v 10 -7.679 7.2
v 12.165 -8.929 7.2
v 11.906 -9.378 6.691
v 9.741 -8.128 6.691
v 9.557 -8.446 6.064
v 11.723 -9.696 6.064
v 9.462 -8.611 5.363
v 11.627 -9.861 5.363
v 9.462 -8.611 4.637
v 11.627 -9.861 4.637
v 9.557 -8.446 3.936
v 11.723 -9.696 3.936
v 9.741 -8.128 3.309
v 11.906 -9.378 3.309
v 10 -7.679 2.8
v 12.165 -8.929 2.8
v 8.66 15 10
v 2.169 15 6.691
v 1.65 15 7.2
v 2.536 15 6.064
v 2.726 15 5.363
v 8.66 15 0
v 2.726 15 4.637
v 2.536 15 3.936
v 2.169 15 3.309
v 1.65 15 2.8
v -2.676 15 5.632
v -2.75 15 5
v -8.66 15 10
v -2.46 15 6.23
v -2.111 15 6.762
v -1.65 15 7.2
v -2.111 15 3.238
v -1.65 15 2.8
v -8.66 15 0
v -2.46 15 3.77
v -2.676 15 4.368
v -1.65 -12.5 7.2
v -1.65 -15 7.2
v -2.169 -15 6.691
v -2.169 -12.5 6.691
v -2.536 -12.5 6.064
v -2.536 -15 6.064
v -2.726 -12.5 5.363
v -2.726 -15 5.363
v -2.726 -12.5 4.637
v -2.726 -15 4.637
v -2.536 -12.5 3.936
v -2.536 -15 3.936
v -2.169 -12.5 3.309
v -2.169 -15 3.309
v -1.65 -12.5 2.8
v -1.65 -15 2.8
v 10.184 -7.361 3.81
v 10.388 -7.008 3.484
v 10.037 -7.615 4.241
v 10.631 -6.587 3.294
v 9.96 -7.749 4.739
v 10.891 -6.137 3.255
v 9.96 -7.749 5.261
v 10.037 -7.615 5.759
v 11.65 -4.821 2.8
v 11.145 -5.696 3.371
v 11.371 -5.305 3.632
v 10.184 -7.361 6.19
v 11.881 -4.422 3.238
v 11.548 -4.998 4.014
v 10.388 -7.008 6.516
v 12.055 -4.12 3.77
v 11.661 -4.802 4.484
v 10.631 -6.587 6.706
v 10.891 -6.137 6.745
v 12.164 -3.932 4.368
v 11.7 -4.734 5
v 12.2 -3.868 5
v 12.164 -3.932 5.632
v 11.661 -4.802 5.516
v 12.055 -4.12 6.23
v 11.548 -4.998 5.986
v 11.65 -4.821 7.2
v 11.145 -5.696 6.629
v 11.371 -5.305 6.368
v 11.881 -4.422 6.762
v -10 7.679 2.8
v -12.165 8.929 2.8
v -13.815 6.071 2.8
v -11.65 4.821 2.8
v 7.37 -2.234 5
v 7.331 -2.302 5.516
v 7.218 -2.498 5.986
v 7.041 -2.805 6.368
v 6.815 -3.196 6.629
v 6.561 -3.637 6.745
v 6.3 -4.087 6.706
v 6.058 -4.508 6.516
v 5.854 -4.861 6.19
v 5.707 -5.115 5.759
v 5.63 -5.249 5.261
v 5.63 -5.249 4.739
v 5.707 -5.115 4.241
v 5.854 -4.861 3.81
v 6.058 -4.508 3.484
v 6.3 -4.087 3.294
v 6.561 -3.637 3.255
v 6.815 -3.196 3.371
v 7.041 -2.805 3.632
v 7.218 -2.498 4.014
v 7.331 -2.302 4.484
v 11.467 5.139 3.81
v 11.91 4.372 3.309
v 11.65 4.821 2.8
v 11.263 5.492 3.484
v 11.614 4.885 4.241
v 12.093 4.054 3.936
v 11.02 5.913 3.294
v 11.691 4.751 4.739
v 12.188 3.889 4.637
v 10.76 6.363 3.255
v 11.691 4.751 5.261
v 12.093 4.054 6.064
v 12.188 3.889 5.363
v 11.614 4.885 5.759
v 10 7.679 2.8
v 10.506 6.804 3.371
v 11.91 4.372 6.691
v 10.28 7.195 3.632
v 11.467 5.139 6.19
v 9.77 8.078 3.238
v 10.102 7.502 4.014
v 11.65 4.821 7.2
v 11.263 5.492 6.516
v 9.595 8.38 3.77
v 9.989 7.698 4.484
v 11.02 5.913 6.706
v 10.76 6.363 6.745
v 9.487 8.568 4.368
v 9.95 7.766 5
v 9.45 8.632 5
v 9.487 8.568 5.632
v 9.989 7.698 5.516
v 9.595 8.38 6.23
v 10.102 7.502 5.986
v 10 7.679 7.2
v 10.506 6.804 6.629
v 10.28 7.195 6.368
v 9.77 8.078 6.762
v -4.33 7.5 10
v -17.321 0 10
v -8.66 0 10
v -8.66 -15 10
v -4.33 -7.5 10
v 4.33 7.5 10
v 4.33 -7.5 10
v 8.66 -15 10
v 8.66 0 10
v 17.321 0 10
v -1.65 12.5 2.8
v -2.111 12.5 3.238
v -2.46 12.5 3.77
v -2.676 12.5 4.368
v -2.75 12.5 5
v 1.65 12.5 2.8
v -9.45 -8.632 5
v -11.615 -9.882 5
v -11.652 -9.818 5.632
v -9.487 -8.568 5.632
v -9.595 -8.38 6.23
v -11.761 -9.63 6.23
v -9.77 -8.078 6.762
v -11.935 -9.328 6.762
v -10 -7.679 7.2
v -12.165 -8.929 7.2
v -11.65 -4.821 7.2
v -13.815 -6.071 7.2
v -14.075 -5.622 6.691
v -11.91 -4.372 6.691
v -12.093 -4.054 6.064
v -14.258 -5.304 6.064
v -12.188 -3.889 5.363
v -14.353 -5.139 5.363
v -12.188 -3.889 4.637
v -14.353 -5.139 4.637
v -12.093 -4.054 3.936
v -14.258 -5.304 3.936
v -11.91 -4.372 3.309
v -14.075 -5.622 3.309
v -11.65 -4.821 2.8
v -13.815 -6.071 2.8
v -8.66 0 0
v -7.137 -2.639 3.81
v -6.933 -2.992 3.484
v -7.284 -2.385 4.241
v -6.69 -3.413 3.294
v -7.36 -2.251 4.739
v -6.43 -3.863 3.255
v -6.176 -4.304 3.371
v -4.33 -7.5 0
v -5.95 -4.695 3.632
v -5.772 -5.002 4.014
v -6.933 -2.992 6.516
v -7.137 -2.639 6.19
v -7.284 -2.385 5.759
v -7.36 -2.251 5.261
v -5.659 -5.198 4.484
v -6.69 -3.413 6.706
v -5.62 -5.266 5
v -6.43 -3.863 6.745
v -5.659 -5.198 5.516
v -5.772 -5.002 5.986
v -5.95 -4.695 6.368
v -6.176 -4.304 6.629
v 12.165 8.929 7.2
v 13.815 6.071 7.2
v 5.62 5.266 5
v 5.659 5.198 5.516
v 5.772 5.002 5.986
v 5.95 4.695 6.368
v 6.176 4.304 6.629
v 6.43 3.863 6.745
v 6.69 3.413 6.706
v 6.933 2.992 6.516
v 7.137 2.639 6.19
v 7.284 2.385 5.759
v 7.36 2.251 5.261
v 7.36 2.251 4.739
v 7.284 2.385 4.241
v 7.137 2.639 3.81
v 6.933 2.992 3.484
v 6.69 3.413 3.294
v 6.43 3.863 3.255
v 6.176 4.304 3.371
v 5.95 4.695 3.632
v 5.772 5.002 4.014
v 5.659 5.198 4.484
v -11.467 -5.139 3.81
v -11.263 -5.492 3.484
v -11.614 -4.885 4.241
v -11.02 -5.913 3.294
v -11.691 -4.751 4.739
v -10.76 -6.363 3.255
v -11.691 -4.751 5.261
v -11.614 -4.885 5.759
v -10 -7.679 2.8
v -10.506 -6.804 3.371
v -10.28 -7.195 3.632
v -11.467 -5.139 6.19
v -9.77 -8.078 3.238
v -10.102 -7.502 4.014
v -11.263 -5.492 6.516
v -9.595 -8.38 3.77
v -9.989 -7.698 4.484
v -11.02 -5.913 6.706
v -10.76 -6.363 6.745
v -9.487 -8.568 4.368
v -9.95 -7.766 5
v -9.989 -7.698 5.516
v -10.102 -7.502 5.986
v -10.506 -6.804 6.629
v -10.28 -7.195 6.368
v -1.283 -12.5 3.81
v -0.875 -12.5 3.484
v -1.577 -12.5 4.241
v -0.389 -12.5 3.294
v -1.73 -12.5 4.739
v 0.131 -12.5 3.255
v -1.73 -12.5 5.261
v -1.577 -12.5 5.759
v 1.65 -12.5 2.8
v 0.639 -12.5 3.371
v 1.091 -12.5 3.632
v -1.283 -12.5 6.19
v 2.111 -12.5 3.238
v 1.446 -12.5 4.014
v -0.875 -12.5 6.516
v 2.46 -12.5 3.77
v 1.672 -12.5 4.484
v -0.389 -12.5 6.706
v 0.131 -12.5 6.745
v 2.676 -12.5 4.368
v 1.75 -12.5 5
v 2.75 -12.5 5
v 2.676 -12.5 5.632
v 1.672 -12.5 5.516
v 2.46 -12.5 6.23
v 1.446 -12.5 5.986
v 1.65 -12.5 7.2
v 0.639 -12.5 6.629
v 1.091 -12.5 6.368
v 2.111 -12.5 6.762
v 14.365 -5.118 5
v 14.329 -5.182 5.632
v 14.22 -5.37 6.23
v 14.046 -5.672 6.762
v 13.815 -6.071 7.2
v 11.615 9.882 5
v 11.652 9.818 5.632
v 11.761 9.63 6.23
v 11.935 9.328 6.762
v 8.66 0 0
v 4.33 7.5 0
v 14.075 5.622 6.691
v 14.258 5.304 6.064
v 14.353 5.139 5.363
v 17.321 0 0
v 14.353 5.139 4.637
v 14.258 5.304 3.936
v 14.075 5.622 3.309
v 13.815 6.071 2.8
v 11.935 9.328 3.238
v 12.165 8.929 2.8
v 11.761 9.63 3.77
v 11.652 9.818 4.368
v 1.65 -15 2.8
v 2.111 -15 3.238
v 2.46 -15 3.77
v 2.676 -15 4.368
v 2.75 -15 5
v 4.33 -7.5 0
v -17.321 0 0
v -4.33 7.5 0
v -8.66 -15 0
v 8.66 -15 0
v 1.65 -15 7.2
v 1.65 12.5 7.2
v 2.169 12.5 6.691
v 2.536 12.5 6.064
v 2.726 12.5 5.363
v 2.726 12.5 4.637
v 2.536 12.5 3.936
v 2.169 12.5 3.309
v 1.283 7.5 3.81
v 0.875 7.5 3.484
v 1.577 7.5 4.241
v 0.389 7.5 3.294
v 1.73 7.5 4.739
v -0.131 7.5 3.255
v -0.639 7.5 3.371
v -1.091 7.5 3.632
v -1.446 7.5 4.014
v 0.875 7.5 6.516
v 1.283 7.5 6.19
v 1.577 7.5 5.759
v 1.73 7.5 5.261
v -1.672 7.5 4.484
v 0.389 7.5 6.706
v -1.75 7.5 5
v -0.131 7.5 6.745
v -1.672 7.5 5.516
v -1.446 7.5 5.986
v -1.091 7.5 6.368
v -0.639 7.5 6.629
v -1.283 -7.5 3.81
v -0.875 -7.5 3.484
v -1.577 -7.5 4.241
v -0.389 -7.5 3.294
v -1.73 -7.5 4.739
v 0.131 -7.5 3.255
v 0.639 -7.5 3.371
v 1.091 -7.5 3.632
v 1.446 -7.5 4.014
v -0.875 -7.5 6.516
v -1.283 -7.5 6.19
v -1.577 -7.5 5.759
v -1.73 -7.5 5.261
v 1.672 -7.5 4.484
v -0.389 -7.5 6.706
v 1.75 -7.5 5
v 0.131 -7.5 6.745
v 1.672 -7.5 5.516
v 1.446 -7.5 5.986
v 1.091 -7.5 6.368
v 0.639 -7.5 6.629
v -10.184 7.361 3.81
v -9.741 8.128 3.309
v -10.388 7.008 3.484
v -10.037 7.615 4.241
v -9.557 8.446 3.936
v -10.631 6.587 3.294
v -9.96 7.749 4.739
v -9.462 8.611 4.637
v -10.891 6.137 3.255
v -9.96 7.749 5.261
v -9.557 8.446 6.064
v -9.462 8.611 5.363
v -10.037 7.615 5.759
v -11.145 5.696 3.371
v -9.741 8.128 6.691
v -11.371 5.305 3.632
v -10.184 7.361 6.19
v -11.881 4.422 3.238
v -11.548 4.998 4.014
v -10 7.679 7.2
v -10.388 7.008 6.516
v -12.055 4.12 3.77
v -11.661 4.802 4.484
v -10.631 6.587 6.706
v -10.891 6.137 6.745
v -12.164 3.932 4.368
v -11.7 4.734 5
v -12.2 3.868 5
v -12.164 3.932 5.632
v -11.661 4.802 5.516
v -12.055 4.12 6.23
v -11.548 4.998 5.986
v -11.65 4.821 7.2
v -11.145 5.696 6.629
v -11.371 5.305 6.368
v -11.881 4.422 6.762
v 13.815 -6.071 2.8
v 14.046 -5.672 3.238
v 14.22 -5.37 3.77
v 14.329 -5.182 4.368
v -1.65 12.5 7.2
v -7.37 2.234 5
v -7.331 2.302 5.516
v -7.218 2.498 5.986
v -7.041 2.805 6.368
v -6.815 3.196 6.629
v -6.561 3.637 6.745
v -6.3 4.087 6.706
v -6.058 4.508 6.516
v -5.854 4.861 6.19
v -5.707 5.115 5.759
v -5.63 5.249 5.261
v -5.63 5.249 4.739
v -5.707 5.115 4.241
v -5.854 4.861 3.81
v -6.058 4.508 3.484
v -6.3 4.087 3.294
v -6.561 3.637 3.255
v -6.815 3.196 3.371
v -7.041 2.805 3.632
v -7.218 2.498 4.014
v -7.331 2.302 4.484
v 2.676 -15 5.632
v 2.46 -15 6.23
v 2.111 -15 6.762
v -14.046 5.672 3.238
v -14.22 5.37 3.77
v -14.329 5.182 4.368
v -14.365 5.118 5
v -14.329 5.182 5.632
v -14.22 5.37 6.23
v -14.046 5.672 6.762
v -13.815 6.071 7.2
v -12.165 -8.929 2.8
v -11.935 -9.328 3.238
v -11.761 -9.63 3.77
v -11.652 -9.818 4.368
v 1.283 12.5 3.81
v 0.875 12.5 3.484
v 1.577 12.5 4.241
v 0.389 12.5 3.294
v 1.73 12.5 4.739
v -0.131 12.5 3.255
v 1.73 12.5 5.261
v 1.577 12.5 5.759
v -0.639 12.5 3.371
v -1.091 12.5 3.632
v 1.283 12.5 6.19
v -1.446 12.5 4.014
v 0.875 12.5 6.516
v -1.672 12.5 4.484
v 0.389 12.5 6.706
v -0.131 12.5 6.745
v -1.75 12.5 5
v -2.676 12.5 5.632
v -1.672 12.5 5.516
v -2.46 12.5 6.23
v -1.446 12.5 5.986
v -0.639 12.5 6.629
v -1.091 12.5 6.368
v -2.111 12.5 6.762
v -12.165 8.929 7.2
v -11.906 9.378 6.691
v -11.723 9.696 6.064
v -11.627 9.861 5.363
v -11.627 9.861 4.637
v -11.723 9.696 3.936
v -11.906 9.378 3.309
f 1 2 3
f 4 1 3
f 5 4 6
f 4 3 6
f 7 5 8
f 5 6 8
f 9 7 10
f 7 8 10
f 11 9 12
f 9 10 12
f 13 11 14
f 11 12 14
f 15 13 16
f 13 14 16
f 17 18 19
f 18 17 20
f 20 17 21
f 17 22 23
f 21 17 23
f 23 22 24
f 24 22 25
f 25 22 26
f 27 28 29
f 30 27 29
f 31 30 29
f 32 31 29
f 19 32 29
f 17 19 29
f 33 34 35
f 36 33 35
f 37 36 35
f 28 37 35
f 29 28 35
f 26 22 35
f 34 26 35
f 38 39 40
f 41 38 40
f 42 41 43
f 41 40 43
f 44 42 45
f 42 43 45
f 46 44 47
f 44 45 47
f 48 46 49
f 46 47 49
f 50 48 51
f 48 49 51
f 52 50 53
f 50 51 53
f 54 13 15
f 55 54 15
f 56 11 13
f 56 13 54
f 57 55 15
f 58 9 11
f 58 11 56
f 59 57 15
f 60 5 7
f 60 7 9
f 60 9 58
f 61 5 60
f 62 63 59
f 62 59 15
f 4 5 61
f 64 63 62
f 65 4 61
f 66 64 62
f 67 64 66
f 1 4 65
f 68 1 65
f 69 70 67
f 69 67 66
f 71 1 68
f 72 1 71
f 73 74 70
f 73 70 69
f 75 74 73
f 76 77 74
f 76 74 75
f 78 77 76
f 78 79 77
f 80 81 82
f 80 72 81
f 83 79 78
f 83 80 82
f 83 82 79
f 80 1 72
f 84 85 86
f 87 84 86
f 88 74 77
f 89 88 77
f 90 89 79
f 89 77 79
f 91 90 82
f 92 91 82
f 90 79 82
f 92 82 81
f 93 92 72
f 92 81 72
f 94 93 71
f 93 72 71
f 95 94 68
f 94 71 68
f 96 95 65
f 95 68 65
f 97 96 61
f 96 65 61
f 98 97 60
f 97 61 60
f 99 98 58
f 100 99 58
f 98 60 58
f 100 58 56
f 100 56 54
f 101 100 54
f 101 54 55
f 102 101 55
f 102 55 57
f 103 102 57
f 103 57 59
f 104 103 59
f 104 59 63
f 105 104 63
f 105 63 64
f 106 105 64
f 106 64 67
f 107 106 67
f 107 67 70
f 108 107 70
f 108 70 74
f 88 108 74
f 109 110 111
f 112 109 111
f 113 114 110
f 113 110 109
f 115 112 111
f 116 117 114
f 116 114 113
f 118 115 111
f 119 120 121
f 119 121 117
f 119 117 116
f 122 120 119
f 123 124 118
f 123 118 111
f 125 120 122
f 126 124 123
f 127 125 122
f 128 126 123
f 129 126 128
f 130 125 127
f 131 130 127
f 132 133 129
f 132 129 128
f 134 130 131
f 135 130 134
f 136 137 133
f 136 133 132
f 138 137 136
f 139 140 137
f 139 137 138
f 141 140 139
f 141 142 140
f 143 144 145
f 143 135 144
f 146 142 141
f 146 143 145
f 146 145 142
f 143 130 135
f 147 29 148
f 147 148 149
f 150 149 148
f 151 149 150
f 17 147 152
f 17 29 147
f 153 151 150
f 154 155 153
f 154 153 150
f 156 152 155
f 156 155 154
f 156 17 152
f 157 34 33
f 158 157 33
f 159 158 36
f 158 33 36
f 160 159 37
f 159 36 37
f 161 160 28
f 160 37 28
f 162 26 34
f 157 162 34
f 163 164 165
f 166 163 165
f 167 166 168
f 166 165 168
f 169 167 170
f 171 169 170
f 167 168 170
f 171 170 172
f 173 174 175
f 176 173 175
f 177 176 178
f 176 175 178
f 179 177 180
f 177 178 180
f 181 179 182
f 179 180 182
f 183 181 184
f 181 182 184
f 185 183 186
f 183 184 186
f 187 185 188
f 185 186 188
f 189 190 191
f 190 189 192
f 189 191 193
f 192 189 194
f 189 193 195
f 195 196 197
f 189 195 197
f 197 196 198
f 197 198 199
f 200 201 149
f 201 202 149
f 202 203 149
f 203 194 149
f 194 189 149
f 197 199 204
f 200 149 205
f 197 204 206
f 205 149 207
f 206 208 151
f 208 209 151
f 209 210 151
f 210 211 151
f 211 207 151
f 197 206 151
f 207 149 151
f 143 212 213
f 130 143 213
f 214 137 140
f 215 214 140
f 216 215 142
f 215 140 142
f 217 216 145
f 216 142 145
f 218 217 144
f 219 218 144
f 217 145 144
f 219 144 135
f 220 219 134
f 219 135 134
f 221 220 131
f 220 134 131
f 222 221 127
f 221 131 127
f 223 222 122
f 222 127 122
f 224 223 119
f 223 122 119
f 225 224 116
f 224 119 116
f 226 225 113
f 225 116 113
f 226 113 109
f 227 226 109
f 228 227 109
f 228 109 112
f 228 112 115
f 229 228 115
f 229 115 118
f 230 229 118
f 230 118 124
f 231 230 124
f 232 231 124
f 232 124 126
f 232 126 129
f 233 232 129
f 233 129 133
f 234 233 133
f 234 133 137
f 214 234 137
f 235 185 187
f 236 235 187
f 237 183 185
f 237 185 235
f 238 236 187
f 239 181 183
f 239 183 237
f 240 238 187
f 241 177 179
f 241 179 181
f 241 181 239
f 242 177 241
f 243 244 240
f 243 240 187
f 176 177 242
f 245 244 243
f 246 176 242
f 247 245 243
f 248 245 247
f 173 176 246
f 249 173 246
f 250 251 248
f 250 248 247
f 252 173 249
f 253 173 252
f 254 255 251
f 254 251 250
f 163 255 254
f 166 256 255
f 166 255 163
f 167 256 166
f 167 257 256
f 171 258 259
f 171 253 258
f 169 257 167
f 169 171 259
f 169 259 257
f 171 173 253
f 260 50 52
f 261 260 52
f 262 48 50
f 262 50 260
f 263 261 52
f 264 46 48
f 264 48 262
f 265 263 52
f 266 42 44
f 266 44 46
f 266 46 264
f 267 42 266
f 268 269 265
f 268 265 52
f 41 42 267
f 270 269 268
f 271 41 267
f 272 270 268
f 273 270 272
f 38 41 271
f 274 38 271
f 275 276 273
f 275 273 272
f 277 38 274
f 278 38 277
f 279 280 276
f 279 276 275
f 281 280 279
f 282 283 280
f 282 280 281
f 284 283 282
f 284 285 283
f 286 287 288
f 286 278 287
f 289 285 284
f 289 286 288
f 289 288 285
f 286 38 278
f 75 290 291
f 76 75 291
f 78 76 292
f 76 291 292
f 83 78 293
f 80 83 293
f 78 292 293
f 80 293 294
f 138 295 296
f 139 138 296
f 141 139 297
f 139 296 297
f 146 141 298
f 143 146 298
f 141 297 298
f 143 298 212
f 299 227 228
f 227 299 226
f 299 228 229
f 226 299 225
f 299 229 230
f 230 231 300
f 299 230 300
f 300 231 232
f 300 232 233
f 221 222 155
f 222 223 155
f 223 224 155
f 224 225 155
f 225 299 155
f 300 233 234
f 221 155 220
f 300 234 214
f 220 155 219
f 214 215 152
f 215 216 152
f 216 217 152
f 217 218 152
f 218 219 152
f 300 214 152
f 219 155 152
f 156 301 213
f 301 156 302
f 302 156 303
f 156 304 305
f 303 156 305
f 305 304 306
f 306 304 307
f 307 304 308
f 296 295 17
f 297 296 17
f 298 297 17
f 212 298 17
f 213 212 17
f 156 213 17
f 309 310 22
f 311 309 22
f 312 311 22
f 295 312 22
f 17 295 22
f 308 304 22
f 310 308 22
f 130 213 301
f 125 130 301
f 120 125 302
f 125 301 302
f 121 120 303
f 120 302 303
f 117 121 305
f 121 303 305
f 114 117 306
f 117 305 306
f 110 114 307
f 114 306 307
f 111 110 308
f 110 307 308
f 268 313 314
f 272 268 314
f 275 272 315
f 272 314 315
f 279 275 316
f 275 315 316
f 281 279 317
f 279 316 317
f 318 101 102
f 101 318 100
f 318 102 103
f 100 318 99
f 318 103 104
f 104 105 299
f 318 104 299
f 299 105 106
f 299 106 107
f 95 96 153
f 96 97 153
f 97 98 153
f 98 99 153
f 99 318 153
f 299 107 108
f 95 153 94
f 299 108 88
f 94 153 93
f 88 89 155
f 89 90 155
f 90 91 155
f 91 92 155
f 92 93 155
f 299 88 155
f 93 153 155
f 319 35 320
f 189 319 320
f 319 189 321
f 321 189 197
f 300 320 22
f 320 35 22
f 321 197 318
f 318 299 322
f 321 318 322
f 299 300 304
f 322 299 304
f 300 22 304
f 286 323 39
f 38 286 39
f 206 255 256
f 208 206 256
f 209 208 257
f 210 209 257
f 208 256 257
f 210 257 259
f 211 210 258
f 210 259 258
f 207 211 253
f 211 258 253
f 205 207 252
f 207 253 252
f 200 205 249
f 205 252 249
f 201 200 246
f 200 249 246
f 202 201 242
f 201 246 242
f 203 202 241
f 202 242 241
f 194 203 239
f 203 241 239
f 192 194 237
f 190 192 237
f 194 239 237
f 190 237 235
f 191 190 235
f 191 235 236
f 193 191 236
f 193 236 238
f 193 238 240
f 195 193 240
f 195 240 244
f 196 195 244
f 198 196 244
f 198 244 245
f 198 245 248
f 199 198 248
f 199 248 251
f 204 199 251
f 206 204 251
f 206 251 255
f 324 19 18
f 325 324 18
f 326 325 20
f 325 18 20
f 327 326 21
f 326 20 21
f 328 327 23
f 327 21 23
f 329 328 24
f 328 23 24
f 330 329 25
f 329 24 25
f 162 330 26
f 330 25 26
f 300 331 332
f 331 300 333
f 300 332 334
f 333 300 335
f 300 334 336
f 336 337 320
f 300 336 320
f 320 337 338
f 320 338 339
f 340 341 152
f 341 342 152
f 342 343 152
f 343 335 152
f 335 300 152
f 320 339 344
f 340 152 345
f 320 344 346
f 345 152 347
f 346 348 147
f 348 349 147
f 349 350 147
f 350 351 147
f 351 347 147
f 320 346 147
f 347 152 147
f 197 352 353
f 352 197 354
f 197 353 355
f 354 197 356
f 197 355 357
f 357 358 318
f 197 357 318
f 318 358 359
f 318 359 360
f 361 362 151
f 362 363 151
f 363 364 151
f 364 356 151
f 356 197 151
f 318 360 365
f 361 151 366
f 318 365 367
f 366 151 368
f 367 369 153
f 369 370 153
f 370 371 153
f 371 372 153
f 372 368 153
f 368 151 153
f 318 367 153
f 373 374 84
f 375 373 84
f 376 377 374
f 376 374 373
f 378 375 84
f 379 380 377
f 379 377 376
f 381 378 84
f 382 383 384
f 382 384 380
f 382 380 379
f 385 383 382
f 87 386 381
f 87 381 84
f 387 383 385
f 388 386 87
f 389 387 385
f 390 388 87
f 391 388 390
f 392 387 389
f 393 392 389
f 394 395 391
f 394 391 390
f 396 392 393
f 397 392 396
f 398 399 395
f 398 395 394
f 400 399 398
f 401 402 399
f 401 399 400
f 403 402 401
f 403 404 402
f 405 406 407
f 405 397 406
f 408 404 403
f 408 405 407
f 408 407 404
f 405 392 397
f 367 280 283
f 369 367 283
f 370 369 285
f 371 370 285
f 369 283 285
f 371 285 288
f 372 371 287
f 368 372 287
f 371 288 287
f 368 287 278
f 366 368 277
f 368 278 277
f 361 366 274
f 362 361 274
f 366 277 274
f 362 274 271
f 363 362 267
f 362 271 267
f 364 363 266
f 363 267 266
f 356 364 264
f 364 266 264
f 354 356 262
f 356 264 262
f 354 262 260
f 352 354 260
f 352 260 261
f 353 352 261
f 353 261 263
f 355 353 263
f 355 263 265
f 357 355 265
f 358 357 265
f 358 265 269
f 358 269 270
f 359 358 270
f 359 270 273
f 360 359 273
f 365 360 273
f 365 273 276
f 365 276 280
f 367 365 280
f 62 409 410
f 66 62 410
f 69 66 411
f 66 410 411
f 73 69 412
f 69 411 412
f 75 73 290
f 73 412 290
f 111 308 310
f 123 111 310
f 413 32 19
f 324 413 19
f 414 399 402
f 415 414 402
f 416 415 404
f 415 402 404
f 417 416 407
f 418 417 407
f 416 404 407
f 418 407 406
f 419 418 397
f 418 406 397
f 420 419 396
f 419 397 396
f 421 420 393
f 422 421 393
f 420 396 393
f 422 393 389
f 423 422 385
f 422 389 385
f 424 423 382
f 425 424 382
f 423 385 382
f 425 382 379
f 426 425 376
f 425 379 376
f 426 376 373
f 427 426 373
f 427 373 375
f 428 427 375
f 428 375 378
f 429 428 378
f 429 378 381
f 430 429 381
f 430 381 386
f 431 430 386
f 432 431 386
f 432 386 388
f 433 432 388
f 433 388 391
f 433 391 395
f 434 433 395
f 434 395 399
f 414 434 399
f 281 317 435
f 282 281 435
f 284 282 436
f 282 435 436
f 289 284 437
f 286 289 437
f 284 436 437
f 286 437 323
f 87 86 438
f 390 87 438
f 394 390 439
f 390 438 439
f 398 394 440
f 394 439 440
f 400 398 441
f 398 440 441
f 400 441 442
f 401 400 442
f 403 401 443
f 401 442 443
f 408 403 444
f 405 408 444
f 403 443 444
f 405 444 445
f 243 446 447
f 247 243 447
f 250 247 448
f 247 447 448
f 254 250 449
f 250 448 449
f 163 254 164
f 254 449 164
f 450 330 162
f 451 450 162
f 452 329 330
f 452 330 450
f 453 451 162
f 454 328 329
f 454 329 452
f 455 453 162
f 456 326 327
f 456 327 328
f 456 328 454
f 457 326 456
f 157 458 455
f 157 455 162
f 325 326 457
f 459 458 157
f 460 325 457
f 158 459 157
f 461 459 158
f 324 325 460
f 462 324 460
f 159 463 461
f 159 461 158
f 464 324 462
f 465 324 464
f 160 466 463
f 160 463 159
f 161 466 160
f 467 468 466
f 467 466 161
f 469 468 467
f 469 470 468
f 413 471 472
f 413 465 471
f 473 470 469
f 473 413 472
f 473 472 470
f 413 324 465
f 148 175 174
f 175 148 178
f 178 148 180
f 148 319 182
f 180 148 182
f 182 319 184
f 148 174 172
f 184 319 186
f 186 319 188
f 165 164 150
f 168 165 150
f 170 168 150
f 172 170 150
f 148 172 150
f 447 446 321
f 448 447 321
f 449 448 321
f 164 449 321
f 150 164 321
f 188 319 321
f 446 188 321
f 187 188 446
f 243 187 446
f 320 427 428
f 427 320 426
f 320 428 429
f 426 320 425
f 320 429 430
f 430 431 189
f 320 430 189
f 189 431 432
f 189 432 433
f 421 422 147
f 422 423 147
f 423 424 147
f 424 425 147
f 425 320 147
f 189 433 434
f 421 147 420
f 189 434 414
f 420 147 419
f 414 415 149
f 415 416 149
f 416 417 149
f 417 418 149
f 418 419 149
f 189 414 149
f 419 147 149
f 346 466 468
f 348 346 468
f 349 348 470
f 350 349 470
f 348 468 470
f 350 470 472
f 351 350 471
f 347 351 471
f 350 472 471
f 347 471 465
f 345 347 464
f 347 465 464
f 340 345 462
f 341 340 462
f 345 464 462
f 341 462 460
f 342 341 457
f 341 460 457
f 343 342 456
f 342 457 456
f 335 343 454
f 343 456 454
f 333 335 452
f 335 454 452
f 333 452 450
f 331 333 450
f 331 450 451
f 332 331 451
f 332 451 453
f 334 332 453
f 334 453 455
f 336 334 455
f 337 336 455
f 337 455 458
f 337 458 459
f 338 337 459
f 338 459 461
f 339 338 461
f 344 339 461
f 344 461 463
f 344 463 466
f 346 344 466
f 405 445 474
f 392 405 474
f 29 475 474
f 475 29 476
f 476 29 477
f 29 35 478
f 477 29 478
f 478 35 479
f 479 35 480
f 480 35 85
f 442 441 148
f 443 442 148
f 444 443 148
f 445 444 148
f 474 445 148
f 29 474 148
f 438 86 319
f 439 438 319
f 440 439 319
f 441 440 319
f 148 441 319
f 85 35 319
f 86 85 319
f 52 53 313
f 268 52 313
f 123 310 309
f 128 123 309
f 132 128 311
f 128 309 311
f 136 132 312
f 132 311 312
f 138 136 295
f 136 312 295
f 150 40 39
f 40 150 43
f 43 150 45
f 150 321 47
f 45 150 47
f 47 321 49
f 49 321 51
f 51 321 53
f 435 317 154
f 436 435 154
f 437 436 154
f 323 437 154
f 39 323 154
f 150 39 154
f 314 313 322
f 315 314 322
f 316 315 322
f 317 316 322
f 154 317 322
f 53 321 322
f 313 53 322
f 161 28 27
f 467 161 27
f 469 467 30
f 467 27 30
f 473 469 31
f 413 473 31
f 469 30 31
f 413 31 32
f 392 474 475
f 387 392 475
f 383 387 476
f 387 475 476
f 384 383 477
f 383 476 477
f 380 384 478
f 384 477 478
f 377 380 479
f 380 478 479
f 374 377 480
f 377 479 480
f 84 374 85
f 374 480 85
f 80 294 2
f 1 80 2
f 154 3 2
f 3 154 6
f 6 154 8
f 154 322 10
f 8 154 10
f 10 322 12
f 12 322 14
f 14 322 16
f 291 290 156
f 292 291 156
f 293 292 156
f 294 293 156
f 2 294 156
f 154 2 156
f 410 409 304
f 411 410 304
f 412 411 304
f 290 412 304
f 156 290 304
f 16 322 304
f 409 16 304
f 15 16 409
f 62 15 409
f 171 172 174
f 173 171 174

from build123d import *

# Parameters (mm, degrees)
F1_DEPTH = 10
F2_R     = 1.75
F3_DEPTH = 25
F4_DEPTH = 2.5
F6_COUNT = 6
F8_DEPTH = 25


with BuildPart() as f1:
    # F0 (on Top) → F1 (new body)
    with BuildSketch(Plane.XY):
        Polygon((-8.660254, -15), (8.660254, -15), (0, 0), align=None)
    extrude(amount=F1_DEPTH)

    # F2 (on face) → F3 (cut)
    with BuildSketch(Plane.XZ.offset(15)):
        with Locations((0, 5)):
            Circle(F2_R)
    extrude(amount=-F3_DEPTH, mode=Mode.SUBTRACT)

    # F2 (on face) → F4 (cut)
    with BuildSketch(Plane.XZ.offset(15)):
        with BuildLine():
            ThreePointArc((1.65, 2.8), (2.459675, 3.770163), (2.75, 5))
            ThreePointArc((2.75, 5), (2.459675, 6.229837), (1.65, 7.2))
            Line((1.65, 7.2), (-1.65, 7.2))
            ThreePointArc((-1.65, 7.2), (-2.75, 5), (-1.65, 2.8))
            Line((-1.65, 2.8), (1.65, 2.8))
        make_face()
        with Locations((0, 5)):
            Circle(F2_R, mode=Mode.SUBTRACT)
    extrude(amount=-F4_DEPTH, mode=Mode.SUBTRACT)

    # F6: F1 ×6 about axis
    f6_axis = Axis((0, 0, 7.747169), (0, 0, 1))


with BuildPart() as f1_1:
    add(f1.part)
    for i in range(1, F6_COUNT):
        add(f1.part.rotate(f6_axis, i * 360 / F6_COUNT))

    # F7 (on face) → F8 (cut)
    with BuildSketch(Plane.XY.offset(10)):
        Polygon((-4.330127, -7.5), (4.330127, -7.5), (8.660254, 0), (4.330127, 7.5), (-4.330127, 7.5), (-8.660254, 0), align=None)
    extrude(amount=-F8_DEPTH, mode=Mode.SUBTRACT)


solid = f1_1.part
